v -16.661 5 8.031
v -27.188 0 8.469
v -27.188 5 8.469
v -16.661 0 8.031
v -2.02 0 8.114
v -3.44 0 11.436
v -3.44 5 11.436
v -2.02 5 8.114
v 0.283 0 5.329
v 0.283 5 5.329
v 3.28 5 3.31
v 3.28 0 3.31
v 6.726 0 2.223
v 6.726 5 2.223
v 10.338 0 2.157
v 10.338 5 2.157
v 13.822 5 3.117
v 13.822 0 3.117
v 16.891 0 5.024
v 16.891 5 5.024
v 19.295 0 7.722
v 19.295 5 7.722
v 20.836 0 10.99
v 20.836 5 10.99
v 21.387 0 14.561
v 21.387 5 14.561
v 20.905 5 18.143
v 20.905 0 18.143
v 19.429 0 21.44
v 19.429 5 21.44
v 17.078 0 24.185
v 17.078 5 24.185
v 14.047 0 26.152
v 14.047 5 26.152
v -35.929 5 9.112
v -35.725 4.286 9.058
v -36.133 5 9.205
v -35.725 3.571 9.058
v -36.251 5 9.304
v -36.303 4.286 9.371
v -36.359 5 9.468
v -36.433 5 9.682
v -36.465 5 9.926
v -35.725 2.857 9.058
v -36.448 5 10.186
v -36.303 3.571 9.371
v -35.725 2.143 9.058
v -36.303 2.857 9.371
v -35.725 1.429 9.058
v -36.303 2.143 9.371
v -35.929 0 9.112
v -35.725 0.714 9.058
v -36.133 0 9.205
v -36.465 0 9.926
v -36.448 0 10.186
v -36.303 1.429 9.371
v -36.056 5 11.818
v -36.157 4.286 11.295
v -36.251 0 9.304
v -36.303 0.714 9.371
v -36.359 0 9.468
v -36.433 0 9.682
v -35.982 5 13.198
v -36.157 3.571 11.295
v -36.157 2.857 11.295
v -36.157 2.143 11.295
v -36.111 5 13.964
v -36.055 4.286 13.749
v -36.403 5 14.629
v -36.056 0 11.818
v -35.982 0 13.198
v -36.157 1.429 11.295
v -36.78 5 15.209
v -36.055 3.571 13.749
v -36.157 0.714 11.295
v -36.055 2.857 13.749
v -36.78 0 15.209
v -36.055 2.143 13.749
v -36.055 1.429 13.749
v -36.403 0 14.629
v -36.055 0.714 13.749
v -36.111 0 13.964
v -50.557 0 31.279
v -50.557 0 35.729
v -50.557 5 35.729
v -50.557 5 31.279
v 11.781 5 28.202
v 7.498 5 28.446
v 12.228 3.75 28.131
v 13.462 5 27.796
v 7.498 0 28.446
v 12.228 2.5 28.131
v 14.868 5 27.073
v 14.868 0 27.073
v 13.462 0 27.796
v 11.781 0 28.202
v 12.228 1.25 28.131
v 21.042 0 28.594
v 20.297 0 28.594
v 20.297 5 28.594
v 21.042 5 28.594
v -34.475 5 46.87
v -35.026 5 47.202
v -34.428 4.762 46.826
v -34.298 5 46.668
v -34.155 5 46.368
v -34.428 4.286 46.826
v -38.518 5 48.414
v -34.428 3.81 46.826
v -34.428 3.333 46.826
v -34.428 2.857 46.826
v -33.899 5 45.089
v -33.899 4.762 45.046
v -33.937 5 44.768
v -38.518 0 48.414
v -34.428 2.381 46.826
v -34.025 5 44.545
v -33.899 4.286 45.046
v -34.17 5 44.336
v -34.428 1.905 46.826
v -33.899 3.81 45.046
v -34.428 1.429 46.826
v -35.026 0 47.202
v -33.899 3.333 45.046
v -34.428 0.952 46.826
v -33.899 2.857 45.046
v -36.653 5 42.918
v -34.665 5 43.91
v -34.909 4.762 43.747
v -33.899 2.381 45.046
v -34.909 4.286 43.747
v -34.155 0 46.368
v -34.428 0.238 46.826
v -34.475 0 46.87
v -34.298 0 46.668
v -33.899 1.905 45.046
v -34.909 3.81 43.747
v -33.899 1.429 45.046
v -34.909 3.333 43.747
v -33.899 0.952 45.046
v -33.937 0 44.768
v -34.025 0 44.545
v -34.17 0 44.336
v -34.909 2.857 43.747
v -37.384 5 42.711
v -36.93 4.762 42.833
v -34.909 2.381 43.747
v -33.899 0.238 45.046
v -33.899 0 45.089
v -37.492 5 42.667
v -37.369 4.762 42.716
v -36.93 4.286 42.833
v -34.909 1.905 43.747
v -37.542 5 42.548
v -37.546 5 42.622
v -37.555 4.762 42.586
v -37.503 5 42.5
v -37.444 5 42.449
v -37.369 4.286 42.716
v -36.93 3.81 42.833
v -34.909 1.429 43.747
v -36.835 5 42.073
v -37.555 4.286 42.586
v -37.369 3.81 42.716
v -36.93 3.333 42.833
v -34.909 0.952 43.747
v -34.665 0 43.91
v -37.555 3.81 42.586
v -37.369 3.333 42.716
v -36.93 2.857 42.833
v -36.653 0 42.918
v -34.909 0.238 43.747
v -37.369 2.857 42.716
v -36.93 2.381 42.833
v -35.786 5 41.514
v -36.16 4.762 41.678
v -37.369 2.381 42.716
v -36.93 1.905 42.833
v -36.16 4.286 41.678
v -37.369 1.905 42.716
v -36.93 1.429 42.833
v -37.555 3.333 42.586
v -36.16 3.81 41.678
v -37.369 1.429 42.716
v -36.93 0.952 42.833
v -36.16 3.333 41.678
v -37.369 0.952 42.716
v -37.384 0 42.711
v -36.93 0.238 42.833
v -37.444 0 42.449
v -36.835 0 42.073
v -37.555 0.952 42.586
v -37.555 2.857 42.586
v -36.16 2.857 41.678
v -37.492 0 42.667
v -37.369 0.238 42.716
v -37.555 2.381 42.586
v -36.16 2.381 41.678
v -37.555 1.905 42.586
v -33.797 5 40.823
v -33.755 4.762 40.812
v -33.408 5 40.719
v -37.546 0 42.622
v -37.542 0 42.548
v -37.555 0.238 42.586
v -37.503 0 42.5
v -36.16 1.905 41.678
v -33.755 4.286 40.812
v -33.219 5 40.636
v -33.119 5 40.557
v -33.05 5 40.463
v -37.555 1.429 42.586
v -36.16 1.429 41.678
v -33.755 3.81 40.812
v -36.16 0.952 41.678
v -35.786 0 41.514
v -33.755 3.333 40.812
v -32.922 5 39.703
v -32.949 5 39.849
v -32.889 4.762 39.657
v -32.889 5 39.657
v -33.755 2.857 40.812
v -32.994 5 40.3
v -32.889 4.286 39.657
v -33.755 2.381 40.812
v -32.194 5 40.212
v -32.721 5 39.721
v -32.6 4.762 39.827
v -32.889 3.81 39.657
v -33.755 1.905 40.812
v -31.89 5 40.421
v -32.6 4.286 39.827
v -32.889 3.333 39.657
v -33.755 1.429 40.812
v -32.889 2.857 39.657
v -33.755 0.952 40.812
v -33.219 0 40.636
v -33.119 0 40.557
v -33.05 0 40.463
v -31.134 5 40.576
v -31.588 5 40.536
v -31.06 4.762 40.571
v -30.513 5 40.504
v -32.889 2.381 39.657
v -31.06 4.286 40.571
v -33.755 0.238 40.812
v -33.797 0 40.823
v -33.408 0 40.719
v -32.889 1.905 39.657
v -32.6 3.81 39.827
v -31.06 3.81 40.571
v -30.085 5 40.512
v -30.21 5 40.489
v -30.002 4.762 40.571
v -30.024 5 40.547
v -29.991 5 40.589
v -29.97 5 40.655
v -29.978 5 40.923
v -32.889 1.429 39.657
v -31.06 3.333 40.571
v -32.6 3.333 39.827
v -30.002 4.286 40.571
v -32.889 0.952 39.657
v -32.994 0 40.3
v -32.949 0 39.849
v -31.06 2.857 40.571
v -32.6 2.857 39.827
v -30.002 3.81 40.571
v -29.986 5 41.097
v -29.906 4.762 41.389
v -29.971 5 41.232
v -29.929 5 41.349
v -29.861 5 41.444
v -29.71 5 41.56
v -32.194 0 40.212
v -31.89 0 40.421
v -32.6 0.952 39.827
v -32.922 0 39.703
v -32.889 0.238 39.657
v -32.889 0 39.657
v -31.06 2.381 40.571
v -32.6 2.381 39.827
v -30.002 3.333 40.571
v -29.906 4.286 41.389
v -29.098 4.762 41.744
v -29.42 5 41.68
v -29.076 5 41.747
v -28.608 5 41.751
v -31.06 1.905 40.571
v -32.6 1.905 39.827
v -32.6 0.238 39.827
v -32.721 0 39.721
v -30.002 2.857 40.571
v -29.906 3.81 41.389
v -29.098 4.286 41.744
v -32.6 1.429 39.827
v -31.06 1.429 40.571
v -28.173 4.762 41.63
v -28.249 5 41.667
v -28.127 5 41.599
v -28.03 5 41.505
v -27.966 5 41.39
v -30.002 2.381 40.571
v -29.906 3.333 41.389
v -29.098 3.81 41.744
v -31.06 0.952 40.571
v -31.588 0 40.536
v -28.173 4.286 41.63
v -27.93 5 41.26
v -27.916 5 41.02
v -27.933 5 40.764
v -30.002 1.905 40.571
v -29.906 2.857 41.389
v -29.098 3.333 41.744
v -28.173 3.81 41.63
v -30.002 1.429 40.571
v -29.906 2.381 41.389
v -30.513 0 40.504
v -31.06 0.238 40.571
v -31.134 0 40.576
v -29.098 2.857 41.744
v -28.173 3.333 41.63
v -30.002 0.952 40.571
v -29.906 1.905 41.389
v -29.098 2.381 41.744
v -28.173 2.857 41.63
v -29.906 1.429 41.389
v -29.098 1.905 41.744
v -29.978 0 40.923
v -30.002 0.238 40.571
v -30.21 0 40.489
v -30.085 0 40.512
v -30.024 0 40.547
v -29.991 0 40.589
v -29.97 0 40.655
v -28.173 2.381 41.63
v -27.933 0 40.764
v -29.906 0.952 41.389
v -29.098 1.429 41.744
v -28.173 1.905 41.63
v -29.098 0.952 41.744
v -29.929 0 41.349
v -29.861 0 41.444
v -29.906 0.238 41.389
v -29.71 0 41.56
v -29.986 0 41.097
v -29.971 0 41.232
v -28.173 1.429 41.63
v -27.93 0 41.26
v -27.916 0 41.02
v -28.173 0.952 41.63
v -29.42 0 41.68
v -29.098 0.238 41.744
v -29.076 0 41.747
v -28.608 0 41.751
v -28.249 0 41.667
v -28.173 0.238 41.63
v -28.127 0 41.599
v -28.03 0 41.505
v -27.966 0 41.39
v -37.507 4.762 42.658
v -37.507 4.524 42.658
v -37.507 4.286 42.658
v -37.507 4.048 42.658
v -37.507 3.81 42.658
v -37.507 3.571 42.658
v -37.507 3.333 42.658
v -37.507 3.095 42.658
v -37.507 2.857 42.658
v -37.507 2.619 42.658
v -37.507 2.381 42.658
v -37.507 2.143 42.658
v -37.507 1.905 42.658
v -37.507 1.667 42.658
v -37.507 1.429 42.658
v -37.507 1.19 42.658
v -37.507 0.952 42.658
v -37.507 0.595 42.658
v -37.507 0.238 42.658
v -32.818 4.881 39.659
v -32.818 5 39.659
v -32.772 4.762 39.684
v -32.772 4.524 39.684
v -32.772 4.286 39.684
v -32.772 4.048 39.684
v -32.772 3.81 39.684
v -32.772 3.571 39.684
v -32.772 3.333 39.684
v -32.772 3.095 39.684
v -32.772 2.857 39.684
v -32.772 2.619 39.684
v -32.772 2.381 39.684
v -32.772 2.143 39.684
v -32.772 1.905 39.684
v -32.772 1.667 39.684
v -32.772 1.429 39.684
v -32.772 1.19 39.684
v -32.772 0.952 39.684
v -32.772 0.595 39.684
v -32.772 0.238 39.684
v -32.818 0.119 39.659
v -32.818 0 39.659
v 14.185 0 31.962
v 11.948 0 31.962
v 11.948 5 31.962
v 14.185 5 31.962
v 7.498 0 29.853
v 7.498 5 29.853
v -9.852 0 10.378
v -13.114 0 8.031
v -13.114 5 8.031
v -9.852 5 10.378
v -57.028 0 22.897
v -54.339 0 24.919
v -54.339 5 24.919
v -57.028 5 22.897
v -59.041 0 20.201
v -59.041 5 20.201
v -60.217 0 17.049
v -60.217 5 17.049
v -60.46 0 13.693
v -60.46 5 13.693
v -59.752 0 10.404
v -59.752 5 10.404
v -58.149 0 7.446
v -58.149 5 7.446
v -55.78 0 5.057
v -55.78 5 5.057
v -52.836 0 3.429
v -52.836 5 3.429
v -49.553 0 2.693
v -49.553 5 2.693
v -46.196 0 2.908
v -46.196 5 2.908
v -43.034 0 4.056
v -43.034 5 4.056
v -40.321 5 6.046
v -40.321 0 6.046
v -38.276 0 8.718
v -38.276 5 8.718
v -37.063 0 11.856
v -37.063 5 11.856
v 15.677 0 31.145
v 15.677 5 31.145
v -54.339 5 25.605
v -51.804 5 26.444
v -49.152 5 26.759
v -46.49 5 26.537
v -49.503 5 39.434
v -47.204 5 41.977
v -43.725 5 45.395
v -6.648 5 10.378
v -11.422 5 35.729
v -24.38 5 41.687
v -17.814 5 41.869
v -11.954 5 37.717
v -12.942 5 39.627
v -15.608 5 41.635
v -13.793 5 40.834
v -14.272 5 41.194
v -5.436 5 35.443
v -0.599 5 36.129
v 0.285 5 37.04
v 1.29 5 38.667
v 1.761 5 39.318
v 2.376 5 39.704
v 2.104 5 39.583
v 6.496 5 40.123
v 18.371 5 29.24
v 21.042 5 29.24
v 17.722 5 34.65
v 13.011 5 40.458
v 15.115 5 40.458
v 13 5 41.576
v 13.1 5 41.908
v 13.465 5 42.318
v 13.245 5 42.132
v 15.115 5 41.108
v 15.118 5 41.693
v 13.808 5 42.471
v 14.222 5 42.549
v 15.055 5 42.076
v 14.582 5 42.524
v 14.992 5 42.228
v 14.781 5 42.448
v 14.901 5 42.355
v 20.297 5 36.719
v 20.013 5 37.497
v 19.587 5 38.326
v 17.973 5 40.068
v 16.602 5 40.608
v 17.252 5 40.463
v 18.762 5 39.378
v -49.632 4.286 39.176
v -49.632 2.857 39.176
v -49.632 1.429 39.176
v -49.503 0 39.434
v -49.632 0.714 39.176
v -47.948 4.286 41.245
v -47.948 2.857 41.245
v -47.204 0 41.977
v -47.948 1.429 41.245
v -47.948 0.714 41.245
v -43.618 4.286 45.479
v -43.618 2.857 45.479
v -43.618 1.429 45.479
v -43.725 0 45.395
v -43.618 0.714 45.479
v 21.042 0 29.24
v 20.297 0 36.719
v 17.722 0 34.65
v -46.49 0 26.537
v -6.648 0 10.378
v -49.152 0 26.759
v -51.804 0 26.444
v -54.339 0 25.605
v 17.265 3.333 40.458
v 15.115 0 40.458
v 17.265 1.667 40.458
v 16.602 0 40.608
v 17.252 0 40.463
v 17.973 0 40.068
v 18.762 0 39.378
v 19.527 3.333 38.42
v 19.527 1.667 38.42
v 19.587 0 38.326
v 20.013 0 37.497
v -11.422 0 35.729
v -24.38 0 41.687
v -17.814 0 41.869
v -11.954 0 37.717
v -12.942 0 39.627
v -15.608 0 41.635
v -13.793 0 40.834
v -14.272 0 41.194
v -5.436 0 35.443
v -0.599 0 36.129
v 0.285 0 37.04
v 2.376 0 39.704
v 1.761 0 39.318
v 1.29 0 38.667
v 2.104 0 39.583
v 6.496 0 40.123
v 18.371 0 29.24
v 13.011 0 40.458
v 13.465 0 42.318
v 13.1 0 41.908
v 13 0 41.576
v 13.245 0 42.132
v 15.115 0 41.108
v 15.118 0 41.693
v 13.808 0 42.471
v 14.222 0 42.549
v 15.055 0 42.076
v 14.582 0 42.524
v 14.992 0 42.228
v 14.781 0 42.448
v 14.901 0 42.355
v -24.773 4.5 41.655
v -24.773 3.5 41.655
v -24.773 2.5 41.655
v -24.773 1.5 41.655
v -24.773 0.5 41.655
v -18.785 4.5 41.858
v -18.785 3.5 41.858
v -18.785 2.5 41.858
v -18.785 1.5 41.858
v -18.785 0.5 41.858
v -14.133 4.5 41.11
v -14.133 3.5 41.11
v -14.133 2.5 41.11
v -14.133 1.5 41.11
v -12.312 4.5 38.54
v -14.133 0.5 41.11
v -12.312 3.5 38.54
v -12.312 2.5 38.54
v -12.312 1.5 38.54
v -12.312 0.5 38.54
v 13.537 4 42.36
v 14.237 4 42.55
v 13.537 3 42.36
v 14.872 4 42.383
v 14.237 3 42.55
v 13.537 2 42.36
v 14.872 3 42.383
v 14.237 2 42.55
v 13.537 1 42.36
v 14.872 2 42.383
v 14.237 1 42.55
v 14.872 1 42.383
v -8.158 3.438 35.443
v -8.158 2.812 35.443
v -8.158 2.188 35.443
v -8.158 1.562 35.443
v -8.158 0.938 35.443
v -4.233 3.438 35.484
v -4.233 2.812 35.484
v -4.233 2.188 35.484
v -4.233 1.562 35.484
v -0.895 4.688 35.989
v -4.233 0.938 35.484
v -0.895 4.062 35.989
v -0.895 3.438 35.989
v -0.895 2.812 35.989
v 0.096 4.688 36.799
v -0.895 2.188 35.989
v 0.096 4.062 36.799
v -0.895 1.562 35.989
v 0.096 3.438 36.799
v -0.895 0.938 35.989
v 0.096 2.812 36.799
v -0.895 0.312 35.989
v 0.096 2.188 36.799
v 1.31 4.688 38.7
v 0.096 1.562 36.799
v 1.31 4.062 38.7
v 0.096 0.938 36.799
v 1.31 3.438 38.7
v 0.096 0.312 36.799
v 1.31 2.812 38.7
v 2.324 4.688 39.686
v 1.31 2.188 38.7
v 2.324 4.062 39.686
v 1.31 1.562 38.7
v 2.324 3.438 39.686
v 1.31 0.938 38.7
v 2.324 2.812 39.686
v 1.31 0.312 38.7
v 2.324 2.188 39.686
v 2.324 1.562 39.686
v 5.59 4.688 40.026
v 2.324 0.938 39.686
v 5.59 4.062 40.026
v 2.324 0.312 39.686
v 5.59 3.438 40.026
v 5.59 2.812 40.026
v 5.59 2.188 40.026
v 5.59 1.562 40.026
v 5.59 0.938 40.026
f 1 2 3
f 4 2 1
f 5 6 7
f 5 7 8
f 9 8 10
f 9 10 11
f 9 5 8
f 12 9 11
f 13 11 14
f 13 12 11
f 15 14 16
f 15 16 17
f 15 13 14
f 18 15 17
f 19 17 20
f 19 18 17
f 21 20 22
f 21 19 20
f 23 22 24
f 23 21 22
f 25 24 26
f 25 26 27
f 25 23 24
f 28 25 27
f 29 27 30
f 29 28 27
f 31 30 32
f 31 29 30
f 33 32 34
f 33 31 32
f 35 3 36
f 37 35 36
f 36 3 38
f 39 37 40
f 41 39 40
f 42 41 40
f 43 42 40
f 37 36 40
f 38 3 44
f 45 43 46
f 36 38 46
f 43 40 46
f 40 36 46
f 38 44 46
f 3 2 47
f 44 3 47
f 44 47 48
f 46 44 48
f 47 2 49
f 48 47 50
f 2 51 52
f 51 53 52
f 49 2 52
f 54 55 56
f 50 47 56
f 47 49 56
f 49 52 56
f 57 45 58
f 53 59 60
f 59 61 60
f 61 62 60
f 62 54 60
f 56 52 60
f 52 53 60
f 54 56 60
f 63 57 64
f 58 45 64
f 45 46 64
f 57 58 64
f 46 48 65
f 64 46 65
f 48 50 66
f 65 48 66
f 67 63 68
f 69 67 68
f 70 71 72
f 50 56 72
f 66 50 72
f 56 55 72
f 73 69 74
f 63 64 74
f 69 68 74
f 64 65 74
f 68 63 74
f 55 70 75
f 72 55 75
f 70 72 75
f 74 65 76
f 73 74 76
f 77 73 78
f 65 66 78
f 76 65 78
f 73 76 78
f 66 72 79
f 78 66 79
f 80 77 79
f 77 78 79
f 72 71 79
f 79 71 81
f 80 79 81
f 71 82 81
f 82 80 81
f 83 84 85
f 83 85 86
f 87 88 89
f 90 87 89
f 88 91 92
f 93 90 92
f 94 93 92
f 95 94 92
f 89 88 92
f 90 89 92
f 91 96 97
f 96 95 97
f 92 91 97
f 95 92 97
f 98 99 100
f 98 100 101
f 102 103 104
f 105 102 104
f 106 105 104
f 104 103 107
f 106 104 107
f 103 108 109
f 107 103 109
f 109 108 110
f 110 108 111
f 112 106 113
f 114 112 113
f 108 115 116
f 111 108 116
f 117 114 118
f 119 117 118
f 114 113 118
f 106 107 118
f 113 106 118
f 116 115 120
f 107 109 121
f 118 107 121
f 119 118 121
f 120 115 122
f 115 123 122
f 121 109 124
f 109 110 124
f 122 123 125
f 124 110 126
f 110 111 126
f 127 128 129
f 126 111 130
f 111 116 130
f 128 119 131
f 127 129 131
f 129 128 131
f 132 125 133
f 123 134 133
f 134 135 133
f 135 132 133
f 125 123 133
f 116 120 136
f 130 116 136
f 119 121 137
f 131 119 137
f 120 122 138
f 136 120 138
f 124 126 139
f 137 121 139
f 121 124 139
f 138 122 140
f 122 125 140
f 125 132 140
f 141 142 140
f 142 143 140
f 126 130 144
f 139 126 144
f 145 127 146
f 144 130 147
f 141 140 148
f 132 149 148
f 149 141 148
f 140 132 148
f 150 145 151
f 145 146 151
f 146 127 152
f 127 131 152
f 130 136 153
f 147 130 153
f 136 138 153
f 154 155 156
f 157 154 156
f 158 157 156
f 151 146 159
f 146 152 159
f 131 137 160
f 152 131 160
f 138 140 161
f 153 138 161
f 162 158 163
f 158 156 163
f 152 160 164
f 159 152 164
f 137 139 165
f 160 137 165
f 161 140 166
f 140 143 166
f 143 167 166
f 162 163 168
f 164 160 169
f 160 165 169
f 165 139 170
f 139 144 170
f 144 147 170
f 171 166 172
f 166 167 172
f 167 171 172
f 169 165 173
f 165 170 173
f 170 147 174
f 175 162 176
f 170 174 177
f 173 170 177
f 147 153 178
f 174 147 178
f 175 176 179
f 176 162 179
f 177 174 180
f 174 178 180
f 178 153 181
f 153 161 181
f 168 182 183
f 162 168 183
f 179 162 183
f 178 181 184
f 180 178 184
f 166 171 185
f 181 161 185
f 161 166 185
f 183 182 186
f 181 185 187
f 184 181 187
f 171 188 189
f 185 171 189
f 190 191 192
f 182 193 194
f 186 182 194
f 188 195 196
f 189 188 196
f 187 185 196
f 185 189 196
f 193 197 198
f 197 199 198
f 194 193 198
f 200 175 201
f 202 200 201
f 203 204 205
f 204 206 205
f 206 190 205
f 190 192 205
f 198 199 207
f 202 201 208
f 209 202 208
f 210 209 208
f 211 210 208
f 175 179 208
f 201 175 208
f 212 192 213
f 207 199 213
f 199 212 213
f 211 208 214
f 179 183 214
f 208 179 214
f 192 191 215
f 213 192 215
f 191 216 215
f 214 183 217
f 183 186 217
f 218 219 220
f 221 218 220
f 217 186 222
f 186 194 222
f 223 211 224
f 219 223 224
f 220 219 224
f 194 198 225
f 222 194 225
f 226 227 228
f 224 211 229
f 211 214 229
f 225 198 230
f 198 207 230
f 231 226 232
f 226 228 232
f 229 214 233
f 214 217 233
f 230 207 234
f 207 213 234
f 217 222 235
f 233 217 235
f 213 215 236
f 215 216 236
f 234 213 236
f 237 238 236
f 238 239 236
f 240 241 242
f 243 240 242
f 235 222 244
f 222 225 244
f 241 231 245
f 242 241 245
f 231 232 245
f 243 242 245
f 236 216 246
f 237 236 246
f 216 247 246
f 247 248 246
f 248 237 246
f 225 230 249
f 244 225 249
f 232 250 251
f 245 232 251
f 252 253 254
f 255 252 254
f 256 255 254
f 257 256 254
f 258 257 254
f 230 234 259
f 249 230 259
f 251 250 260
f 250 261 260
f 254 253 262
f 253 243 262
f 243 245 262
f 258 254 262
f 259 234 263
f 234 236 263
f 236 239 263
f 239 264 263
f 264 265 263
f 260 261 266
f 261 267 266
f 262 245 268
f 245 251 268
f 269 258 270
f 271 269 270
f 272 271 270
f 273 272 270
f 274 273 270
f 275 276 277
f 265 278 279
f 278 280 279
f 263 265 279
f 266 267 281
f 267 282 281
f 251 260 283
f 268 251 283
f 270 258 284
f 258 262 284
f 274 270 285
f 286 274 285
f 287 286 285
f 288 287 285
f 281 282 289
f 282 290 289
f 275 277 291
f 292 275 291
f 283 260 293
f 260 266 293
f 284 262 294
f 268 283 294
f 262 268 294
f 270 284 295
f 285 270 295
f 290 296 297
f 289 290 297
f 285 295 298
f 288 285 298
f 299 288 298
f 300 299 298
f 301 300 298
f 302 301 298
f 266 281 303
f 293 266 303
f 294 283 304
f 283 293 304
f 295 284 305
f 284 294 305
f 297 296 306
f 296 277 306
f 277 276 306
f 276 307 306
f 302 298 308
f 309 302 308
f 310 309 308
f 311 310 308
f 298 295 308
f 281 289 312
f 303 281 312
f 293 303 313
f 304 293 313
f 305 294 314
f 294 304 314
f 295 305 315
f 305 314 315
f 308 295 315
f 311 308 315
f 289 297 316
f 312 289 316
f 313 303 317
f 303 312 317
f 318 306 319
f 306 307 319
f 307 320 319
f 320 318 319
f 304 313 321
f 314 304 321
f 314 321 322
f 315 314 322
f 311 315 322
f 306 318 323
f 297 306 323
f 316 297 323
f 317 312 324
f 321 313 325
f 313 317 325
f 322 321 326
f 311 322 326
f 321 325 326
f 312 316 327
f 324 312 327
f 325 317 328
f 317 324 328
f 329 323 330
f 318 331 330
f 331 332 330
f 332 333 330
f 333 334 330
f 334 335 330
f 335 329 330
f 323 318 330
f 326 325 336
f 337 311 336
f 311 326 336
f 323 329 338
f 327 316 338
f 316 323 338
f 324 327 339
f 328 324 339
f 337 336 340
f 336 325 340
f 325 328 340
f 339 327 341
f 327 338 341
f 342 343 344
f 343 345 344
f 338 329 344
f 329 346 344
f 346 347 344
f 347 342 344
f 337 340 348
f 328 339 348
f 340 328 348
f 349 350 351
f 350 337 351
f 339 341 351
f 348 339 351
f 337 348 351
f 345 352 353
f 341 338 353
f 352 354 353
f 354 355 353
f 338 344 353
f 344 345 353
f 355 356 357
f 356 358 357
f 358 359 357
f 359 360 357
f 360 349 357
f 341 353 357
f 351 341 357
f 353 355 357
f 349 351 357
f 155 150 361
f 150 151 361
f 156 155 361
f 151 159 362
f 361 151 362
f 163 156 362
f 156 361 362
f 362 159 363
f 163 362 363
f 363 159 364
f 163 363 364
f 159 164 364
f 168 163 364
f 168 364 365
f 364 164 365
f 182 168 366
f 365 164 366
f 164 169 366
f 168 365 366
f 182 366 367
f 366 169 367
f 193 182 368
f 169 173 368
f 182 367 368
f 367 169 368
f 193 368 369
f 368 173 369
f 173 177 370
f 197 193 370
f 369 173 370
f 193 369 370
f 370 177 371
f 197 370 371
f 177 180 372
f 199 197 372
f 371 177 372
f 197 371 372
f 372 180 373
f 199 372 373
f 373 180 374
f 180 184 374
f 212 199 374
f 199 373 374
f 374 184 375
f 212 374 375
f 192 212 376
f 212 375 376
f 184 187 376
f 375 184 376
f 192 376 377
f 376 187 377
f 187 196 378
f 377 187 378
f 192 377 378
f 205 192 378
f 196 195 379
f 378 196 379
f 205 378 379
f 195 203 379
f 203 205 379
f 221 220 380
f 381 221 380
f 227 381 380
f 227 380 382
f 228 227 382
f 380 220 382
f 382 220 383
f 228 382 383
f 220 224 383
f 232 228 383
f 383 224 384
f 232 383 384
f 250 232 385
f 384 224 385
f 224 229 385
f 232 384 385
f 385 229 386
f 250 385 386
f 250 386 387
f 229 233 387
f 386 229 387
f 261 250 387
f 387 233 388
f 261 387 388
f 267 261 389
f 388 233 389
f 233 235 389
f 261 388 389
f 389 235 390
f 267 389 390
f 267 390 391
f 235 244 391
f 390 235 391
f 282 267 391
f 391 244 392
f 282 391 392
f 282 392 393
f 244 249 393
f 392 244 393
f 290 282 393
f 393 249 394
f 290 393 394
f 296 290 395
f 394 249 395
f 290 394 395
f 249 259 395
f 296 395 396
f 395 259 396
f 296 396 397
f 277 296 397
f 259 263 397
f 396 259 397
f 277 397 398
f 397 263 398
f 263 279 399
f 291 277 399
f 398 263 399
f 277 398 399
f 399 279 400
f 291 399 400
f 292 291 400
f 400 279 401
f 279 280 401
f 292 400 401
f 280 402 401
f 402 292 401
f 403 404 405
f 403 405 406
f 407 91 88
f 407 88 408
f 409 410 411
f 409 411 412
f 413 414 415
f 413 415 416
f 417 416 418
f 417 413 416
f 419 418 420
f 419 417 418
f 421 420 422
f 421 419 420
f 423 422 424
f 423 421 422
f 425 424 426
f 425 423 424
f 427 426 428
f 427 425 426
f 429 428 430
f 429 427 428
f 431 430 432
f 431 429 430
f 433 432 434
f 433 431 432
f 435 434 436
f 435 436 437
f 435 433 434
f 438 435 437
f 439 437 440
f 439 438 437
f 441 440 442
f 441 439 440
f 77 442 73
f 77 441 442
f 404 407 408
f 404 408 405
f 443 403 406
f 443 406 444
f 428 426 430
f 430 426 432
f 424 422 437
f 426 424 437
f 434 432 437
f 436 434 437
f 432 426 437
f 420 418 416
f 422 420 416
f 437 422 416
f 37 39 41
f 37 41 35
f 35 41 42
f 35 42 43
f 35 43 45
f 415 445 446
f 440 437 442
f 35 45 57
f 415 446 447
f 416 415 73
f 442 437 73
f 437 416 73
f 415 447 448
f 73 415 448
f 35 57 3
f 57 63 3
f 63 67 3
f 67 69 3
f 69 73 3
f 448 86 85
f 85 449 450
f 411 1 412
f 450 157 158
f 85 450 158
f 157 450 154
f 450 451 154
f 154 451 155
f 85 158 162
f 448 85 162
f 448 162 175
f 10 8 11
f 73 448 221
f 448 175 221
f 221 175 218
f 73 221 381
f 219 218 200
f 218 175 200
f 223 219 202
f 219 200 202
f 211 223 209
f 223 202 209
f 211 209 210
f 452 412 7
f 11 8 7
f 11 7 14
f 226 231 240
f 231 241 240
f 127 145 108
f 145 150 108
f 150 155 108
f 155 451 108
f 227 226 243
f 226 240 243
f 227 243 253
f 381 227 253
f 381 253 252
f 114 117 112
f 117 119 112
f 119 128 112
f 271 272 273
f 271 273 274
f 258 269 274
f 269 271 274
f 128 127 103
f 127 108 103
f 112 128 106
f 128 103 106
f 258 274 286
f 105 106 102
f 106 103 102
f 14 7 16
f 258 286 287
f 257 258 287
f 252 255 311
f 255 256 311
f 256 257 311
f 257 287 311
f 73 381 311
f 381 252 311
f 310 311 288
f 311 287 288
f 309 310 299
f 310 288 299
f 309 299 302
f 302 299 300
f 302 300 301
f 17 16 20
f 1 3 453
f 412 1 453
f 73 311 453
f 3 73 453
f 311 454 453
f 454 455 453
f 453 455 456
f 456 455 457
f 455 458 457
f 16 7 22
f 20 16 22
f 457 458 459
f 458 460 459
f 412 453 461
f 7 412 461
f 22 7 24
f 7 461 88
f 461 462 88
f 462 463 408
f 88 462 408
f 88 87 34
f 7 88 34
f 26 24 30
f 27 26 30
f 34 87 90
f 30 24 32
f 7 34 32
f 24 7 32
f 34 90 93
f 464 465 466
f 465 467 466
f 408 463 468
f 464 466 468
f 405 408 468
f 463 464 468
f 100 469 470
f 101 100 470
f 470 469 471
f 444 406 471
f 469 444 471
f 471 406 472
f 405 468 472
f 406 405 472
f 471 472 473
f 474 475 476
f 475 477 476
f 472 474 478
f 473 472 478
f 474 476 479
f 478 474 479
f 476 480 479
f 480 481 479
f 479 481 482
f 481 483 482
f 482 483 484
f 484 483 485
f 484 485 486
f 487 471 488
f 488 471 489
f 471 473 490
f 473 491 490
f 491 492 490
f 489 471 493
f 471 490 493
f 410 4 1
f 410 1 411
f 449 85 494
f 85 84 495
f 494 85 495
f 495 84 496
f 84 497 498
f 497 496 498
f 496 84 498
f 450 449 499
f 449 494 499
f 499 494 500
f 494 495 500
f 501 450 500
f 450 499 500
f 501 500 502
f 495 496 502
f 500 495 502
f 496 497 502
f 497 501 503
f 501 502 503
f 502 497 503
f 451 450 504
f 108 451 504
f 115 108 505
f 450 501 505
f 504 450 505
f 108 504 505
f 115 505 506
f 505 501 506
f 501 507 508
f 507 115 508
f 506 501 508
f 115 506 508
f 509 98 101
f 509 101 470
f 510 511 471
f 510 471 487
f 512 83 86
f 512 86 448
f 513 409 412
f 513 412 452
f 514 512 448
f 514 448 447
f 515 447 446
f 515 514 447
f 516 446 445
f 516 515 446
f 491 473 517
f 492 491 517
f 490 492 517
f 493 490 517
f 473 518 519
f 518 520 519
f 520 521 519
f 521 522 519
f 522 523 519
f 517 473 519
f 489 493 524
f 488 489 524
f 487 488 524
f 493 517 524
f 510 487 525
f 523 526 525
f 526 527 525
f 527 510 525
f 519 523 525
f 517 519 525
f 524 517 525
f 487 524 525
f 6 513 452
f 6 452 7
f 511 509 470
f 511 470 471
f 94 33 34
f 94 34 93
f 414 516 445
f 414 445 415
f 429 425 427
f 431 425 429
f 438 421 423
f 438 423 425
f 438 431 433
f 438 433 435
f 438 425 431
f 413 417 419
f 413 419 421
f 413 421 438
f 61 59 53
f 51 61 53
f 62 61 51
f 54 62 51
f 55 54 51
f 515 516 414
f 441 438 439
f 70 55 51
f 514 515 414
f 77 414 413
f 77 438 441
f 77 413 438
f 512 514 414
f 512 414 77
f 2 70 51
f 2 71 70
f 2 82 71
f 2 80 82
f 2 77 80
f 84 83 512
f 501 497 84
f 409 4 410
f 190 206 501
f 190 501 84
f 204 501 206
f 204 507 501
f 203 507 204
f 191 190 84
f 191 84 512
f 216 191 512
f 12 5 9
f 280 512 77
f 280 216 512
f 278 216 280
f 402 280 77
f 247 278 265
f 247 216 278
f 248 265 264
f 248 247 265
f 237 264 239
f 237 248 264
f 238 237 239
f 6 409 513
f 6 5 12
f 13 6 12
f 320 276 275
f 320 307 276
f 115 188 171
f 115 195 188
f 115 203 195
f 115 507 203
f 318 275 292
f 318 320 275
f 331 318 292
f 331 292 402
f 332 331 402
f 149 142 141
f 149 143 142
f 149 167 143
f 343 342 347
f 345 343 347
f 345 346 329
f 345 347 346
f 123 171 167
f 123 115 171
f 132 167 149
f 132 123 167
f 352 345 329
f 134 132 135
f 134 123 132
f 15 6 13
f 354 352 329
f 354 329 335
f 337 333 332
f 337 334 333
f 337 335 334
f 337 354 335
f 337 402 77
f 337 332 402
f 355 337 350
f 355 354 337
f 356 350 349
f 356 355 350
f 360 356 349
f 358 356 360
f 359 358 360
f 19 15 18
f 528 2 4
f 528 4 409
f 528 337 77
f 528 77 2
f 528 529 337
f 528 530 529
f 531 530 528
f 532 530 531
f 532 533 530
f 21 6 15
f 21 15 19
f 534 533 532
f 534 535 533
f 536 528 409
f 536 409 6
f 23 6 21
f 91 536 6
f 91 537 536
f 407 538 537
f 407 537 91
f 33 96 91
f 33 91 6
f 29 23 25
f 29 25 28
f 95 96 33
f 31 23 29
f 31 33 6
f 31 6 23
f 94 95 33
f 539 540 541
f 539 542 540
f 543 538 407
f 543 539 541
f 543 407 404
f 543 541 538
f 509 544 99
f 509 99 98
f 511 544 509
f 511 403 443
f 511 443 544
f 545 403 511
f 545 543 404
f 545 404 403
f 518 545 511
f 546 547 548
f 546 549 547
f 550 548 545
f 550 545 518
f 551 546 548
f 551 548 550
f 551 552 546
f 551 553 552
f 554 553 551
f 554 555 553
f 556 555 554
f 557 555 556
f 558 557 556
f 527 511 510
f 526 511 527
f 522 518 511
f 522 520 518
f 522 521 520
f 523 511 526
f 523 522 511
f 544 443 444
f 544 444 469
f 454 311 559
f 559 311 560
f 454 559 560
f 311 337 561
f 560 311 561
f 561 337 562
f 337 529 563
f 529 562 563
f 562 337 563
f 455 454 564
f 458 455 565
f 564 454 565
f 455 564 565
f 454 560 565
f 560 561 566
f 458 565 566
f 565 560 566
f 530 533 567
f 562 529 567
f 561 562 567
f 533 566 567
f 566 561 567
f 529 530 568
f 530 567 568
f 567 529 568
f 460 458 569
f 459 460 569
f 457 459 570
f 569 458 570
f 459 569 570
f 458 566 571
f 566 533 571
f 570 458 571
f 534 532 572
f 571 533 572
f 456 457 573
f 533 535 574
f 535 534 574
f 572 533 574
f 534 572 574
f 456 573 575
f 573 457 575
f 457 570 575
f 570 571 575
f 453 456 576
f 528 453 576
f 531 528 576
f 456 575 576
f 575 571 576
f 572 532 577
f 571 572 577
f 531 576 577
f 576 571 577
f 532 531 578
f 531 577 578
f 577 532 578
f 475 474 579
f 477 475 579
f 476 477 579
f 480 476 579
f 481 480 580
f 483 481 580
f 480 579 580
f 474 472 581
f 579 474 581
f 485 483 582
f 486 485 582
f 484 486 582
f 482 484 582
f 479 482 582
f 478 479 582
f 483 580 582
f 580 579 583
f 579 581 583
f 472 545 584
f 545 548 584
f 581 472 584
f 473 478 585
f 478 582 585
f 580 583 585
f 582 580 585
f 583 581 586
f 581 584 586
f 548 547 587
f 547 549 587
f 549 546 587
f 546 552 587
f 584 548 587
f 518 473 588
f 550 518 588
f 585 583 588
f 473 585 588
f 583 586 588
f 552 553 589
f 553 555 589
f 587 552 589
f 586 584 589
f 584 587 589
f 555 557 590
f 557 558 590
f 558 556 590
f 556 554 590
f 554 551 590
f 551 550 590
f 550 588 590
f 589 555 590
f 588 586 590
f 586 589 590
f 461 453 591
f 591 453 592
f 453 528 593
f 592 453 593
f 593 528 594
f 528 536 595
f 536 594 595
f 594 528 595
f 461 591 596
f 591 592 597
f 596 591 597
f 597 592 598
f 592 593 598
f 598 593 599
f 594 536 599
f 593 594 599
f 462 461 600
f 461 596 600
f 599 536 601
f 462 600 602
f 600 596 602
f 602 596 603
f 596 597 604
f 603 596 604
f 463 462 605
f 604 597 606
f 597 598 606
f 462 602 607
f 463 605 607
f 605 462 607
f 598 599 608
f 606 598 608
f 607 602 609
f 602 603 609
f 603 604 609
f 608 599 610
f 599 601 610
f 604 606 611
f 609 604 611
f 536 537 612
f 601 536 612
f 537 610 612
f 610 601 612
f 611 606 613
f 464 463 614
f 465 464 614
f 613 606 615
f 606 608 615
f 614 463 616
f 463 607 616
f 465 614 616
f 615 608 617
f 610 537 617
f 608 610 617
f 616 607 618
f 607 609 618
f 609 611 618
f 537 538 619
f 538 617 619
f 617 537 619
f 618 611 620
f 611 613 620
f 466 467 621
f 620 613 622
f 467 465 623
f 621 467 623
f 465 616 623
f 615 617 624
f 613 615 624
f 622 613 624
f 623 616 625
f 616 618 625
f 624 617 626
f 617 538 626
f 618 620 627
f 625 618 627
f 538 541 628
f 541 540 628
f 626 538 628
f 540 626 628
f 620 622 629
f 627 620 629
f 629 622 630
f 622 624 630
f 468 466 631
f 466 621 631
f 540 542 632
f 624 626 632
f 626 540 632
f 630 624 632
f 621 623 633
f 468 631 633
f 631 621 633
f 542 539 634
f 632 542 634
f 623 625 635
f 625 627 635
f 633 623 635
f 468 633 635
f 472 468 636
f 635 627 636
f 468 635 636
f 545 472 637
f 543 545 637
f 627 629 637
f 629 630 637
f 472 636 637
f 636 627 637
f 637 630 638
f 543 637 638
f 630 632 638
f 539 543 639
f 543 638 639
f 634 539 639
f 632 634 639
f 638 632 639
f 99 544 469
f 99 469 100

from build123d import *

# Parameters (mm, degrees)
F2_DEPTH  = 10
F14_SCALE = 0.5


# Not quite as in the source:
# - a feature names something its author has since deleted; it is built from what else it names
# - the program builds the solid bodies; features that only make, move or delete a surface that nothing else refers to are left out


with BuildPart() as f2:
    # F0 (on Front) → F2 (new body)
    with BuildSketch(Plane.XZ):
        with BuildLine():
            Line((-70.1603144407, 2.7968266513), (-70.1603144407, 1.4234187547))
            ThreePointArc((-70.1603144407, 1.4234187547), (-70.2145489266, -40.1372623928), (-35.0422821939, -17.99669303))
            add(Edge.make_bspline(
                [(-15.8571563661, -31.4765945077), (-18.7177282322, -31.3101976564), (-24.2975162547, -30.9856264864), (-32.7728139412, -30.5720339527), (-34.1921223492, -29.8256076047), (-34.6083105275, -28.1678758484), (-33.5909596521, -25.8280983966), (-33.1225179299, -20.7680472143), (-34.4474763908, -18.8553492631), (-35.0422821939, -17.99669303)],
                knots=[0, 0, 0, 0, 0.2173047805, 0.4238714034, 0.5069732944, 0.59224959, 0.7085549741, 0.8691633, 1, 1, 1, 1], degree=3))
            Line((-15.8571563661, -31.4765945077), (5.1956321113, -32.3513820767))
            Line((5.1956321113, -32.3513820767), (12.2905466706, -32.3513820767))
            Line((12.2905466706, -32.3513820767), (18.8132897019, -27.6581868529))
            Line((18.8132897019, -27.6581868529), (25.2216011286, -27.6581868529))
            Line((25.2216011286, -27.6581868529), (31.6383130848, -25.5408957601))
            ThreePointArc((31.6383130848, -25.5408957601), (72.3006146402, -38.3663180252), (66.61169976, 3.8894563913))
            Line((66.61169976, 3.8894563913), (68.254083395, 5.7316944003))
            add(Edge.make_bspline(
                [(53.5132065415, 8.4772780538), (55.5040504231, 8.3929973978), (59.1229435492, 8.2397946834), (62.8884494062, 8.0039185472), (66.2136316185, 7.0026107145), (67.6151226177, 6.1296776731), (68.254083395, 5.7316944003)],
                knots=[0, 0, 0, 0, 0.309506582, 0.5626112888, 0.8005879231, 1, 1, 1, 1], degree=3))
            Line((53.5132065415, 8.4772780538), (53.5132065415, 11.2915560603))
            Line((53.5132065415, 11.2915560603), (62.4142251909, 15.5102163553))
            Line((62.4142251909, 15.5102163553), (66.8887943029, 15.5102163553))
            Line((66.8887943029, 15.5102163553), (69.8718354106, 13.8771906495))
            Line((69.8718354106, 13.8771906495), (75.2605646849, 10.0667849183))
            Line((75.2605646849, 10.0667849183), (79.1111662984, 8.7739676237))
            Line((79.1111662984, 8.7739676237), (80.6011706591, 8.7739676237))
            Line((80.6011706591, 8.7739676237), (80.6011706591, 10.0667849183))
            Line((80.6011706591, 10.0667849183), (73.9614963531, 20.8856090903))
            Line((73.9614963531, 20.8856090903), (79.1111662984, 25.0245854259))
            add(Edge.make_bspline(
                [(68.7471404672, 32.5022675097), (70.1725898279, 32.7793130486), (73.2938248363, 33.3859457769), (77.916531806, 28.5701341988), (78.7465965554, 26.1065898492), (79.1111662984, 25.0245854259)],
                knots=[0, 0, 0, 0, 0.320372303, 0.7015031719, 1, 1, 1, 1], degree=3))
            add(Edge.make_bspline(
                [(64.5394474268, 32.5022675097), (64.4678746972, 33.3281659297), (64.3336751663, 34.8767331162), (65.3074974299, 36.583257466), (68.9348334976, 37.0546546226), (68.7159394615, 33.752163088), (68.7379893371, 32.8688568812), (68.7471404672, 32.5022675097)],
                knots=[0, 0, 0, 0, 0.2110428468, 0.3957072923, 0.6208524643, 0.8426463487, 1, 1, 1, 1], degree=3))
            add(Edge.make_bspline(
                [(15.6742297113, 23.0450052768), (16.5844261538, 22.950517427), (18.5416596475, 22.7473362503), (22.2134815433, 22.3813790317), (26.7425739772, 22.5076492148), (30.0673752989, 22.4221219429), (33.0687156287, 23.1330233641), (36.7484371708, 23.3396420412), (37.7837193781, 24.1910856931), (38.7803693746, 25.1853678195), (40.0816926768, 27.0530140531), (41.1038373203, 28.9739302108), (41.8159494962, 30.0810432773), (43.1494936511, 31.2259085067), (46.3483660216, 31.3512583703), (49.825758526, 31.617249819), (54.7691971013, 32.2507714382), (60.915638935, 32.4089870339), (64.5394474268, 32.5022675097)],
                knots=[0, 0, 0, 0, 0.0602109997, 0.1294742319, 0.206125857, 0.2710327483, 0.3350993906, 0.4027209808, 0.442562564, 0.4841366051, 0.5387808948, 0.5918687573, 0.632417919, 0.6776597614, 0.7406666278, 0.8075501518, 0.886535753, 1, 1, 1, 1], degree=3))
            add(Edge.make_bspline(
                [(-17.3478778452, 33.1136696041), (-16.7450423087, 33.3235113693), (-15.2765292766, 33.8346878815), (-10.8404654954, 35.2485304708), (-6.6181952167, 34.6630061736), (1.0225500837, 35.4682293276), (5.8986738705, 35.2319050649), (10.5021919637, 34.1876461101), (12.1038937154, 31.6764601114), (13.9997454046, 28.7017140278), (15.0060882242, 26.0327120836), (15.4493929289, 24.0504006879), (15.6742297113, 23.0450052768)],
                knots=[0, 0, 0, 0, 0.0741099478, 0.1805325293, 0.28726009, 0.4261434308, 0.5413357632, 0.6463970839, 0.7316677568, 0.8260877502, 0.9117945958, 1, 1, 1, 1], degree=3))
            add(Edge.make_bspline(
                [(-38.5178700089, 48.413798213), (-37.2086618929, 47.9310095594), (-34.5880423183, 46.9646197389), (-29.9615394566, 45.6999431744), (-29.6125265988, 43.4299128331), (-29.1240780119, 41.6873723706), (-29.6061919281, 40.2143165806), (-31.3477649295, 39.0287920321), (-32.6152258482, 38.2767963146), (-35.0993510451, 37.2129778975), (-37.2117205405, 36.8799871988), (-35.2378339505, 35.8285430158), (-33.8539497276, 34.8614651493), (-31.5699444534, 34.0837040019), (-29.1125300687, 33.1600673113), (-27.1965479006, 32.8675475679), (-27.6060878868, 30.0347312892), (-25.7306387383, 32.44701128), (-23.8437548611, 32.9672791313), (-20.8263691722, 32.1281067533), (-22.2164084081, 35.0023418104), (-17.1508415545, 35.4666855058), (-17.2898376362, 33.8067882885), (-17.3478778452, 33.1136696041)],
                knots=[0, 0, 0, 0, 0.0680352424, 0.1361849854, 0.1819600343, 0.2250268681, 0.2638982165, 0.3096732947, 0.3501564903, 0.4054524889, 0.4430780006, 0.4821240757, 0.5268973467, 0.5770004087, 0.6307843783, 0.6723521021, 0.7130285408, 0.7572149163, 0.8066475228, 0.8539346518, 0.8956454287, 0.9564249506, 1, 1, 1, 1], degree=3))
            add(Edge.make_bspline(
                [(-62.5952631235, 23.0450052768), (-62.3848416036, 24.0428871056), (-61.9419178755, 26.1433639955), (-60.9223040871, 30.0290599328), (-59.4685270888, 31.9650102976), (-57.2850306102, 34.1952396219), (-54.7934110836, 36.5511024905), (-48.8073579355, 43.3714030755), (-42.1151835801, 46.6509236571), (-38.5178700089, 48.413798213)],
                knots=[0, 0, 0, 0, 0.1174395667, 0.2472027136, 0.3492573428, 0.4612870362, 0.5820754532, 0.7753487037, 1, 1, 1, 1], degree=3))
            Line((-62.5952631235, 23.0450052768), (-62.5952631235, 14.1441216692))
            Line((-62.5952631235, 14.1441216692), (-54.4623918831, 4.6601039357))
            ThreePointArc((-54.4623918831, 4.6601039357), (-62.4531100103, 4.922752395), (-70.1603144407, 2.7968266513))
        make_face()
    extrude(amount=-F2_DEPTH)


with BuildPart() as f2_1:
    # F14: moved
    add(f2.part.scale(F14_SCALE).moved(Location((-19.2589350045, 0, 24.2068991065))))


solid = f2_1.part
